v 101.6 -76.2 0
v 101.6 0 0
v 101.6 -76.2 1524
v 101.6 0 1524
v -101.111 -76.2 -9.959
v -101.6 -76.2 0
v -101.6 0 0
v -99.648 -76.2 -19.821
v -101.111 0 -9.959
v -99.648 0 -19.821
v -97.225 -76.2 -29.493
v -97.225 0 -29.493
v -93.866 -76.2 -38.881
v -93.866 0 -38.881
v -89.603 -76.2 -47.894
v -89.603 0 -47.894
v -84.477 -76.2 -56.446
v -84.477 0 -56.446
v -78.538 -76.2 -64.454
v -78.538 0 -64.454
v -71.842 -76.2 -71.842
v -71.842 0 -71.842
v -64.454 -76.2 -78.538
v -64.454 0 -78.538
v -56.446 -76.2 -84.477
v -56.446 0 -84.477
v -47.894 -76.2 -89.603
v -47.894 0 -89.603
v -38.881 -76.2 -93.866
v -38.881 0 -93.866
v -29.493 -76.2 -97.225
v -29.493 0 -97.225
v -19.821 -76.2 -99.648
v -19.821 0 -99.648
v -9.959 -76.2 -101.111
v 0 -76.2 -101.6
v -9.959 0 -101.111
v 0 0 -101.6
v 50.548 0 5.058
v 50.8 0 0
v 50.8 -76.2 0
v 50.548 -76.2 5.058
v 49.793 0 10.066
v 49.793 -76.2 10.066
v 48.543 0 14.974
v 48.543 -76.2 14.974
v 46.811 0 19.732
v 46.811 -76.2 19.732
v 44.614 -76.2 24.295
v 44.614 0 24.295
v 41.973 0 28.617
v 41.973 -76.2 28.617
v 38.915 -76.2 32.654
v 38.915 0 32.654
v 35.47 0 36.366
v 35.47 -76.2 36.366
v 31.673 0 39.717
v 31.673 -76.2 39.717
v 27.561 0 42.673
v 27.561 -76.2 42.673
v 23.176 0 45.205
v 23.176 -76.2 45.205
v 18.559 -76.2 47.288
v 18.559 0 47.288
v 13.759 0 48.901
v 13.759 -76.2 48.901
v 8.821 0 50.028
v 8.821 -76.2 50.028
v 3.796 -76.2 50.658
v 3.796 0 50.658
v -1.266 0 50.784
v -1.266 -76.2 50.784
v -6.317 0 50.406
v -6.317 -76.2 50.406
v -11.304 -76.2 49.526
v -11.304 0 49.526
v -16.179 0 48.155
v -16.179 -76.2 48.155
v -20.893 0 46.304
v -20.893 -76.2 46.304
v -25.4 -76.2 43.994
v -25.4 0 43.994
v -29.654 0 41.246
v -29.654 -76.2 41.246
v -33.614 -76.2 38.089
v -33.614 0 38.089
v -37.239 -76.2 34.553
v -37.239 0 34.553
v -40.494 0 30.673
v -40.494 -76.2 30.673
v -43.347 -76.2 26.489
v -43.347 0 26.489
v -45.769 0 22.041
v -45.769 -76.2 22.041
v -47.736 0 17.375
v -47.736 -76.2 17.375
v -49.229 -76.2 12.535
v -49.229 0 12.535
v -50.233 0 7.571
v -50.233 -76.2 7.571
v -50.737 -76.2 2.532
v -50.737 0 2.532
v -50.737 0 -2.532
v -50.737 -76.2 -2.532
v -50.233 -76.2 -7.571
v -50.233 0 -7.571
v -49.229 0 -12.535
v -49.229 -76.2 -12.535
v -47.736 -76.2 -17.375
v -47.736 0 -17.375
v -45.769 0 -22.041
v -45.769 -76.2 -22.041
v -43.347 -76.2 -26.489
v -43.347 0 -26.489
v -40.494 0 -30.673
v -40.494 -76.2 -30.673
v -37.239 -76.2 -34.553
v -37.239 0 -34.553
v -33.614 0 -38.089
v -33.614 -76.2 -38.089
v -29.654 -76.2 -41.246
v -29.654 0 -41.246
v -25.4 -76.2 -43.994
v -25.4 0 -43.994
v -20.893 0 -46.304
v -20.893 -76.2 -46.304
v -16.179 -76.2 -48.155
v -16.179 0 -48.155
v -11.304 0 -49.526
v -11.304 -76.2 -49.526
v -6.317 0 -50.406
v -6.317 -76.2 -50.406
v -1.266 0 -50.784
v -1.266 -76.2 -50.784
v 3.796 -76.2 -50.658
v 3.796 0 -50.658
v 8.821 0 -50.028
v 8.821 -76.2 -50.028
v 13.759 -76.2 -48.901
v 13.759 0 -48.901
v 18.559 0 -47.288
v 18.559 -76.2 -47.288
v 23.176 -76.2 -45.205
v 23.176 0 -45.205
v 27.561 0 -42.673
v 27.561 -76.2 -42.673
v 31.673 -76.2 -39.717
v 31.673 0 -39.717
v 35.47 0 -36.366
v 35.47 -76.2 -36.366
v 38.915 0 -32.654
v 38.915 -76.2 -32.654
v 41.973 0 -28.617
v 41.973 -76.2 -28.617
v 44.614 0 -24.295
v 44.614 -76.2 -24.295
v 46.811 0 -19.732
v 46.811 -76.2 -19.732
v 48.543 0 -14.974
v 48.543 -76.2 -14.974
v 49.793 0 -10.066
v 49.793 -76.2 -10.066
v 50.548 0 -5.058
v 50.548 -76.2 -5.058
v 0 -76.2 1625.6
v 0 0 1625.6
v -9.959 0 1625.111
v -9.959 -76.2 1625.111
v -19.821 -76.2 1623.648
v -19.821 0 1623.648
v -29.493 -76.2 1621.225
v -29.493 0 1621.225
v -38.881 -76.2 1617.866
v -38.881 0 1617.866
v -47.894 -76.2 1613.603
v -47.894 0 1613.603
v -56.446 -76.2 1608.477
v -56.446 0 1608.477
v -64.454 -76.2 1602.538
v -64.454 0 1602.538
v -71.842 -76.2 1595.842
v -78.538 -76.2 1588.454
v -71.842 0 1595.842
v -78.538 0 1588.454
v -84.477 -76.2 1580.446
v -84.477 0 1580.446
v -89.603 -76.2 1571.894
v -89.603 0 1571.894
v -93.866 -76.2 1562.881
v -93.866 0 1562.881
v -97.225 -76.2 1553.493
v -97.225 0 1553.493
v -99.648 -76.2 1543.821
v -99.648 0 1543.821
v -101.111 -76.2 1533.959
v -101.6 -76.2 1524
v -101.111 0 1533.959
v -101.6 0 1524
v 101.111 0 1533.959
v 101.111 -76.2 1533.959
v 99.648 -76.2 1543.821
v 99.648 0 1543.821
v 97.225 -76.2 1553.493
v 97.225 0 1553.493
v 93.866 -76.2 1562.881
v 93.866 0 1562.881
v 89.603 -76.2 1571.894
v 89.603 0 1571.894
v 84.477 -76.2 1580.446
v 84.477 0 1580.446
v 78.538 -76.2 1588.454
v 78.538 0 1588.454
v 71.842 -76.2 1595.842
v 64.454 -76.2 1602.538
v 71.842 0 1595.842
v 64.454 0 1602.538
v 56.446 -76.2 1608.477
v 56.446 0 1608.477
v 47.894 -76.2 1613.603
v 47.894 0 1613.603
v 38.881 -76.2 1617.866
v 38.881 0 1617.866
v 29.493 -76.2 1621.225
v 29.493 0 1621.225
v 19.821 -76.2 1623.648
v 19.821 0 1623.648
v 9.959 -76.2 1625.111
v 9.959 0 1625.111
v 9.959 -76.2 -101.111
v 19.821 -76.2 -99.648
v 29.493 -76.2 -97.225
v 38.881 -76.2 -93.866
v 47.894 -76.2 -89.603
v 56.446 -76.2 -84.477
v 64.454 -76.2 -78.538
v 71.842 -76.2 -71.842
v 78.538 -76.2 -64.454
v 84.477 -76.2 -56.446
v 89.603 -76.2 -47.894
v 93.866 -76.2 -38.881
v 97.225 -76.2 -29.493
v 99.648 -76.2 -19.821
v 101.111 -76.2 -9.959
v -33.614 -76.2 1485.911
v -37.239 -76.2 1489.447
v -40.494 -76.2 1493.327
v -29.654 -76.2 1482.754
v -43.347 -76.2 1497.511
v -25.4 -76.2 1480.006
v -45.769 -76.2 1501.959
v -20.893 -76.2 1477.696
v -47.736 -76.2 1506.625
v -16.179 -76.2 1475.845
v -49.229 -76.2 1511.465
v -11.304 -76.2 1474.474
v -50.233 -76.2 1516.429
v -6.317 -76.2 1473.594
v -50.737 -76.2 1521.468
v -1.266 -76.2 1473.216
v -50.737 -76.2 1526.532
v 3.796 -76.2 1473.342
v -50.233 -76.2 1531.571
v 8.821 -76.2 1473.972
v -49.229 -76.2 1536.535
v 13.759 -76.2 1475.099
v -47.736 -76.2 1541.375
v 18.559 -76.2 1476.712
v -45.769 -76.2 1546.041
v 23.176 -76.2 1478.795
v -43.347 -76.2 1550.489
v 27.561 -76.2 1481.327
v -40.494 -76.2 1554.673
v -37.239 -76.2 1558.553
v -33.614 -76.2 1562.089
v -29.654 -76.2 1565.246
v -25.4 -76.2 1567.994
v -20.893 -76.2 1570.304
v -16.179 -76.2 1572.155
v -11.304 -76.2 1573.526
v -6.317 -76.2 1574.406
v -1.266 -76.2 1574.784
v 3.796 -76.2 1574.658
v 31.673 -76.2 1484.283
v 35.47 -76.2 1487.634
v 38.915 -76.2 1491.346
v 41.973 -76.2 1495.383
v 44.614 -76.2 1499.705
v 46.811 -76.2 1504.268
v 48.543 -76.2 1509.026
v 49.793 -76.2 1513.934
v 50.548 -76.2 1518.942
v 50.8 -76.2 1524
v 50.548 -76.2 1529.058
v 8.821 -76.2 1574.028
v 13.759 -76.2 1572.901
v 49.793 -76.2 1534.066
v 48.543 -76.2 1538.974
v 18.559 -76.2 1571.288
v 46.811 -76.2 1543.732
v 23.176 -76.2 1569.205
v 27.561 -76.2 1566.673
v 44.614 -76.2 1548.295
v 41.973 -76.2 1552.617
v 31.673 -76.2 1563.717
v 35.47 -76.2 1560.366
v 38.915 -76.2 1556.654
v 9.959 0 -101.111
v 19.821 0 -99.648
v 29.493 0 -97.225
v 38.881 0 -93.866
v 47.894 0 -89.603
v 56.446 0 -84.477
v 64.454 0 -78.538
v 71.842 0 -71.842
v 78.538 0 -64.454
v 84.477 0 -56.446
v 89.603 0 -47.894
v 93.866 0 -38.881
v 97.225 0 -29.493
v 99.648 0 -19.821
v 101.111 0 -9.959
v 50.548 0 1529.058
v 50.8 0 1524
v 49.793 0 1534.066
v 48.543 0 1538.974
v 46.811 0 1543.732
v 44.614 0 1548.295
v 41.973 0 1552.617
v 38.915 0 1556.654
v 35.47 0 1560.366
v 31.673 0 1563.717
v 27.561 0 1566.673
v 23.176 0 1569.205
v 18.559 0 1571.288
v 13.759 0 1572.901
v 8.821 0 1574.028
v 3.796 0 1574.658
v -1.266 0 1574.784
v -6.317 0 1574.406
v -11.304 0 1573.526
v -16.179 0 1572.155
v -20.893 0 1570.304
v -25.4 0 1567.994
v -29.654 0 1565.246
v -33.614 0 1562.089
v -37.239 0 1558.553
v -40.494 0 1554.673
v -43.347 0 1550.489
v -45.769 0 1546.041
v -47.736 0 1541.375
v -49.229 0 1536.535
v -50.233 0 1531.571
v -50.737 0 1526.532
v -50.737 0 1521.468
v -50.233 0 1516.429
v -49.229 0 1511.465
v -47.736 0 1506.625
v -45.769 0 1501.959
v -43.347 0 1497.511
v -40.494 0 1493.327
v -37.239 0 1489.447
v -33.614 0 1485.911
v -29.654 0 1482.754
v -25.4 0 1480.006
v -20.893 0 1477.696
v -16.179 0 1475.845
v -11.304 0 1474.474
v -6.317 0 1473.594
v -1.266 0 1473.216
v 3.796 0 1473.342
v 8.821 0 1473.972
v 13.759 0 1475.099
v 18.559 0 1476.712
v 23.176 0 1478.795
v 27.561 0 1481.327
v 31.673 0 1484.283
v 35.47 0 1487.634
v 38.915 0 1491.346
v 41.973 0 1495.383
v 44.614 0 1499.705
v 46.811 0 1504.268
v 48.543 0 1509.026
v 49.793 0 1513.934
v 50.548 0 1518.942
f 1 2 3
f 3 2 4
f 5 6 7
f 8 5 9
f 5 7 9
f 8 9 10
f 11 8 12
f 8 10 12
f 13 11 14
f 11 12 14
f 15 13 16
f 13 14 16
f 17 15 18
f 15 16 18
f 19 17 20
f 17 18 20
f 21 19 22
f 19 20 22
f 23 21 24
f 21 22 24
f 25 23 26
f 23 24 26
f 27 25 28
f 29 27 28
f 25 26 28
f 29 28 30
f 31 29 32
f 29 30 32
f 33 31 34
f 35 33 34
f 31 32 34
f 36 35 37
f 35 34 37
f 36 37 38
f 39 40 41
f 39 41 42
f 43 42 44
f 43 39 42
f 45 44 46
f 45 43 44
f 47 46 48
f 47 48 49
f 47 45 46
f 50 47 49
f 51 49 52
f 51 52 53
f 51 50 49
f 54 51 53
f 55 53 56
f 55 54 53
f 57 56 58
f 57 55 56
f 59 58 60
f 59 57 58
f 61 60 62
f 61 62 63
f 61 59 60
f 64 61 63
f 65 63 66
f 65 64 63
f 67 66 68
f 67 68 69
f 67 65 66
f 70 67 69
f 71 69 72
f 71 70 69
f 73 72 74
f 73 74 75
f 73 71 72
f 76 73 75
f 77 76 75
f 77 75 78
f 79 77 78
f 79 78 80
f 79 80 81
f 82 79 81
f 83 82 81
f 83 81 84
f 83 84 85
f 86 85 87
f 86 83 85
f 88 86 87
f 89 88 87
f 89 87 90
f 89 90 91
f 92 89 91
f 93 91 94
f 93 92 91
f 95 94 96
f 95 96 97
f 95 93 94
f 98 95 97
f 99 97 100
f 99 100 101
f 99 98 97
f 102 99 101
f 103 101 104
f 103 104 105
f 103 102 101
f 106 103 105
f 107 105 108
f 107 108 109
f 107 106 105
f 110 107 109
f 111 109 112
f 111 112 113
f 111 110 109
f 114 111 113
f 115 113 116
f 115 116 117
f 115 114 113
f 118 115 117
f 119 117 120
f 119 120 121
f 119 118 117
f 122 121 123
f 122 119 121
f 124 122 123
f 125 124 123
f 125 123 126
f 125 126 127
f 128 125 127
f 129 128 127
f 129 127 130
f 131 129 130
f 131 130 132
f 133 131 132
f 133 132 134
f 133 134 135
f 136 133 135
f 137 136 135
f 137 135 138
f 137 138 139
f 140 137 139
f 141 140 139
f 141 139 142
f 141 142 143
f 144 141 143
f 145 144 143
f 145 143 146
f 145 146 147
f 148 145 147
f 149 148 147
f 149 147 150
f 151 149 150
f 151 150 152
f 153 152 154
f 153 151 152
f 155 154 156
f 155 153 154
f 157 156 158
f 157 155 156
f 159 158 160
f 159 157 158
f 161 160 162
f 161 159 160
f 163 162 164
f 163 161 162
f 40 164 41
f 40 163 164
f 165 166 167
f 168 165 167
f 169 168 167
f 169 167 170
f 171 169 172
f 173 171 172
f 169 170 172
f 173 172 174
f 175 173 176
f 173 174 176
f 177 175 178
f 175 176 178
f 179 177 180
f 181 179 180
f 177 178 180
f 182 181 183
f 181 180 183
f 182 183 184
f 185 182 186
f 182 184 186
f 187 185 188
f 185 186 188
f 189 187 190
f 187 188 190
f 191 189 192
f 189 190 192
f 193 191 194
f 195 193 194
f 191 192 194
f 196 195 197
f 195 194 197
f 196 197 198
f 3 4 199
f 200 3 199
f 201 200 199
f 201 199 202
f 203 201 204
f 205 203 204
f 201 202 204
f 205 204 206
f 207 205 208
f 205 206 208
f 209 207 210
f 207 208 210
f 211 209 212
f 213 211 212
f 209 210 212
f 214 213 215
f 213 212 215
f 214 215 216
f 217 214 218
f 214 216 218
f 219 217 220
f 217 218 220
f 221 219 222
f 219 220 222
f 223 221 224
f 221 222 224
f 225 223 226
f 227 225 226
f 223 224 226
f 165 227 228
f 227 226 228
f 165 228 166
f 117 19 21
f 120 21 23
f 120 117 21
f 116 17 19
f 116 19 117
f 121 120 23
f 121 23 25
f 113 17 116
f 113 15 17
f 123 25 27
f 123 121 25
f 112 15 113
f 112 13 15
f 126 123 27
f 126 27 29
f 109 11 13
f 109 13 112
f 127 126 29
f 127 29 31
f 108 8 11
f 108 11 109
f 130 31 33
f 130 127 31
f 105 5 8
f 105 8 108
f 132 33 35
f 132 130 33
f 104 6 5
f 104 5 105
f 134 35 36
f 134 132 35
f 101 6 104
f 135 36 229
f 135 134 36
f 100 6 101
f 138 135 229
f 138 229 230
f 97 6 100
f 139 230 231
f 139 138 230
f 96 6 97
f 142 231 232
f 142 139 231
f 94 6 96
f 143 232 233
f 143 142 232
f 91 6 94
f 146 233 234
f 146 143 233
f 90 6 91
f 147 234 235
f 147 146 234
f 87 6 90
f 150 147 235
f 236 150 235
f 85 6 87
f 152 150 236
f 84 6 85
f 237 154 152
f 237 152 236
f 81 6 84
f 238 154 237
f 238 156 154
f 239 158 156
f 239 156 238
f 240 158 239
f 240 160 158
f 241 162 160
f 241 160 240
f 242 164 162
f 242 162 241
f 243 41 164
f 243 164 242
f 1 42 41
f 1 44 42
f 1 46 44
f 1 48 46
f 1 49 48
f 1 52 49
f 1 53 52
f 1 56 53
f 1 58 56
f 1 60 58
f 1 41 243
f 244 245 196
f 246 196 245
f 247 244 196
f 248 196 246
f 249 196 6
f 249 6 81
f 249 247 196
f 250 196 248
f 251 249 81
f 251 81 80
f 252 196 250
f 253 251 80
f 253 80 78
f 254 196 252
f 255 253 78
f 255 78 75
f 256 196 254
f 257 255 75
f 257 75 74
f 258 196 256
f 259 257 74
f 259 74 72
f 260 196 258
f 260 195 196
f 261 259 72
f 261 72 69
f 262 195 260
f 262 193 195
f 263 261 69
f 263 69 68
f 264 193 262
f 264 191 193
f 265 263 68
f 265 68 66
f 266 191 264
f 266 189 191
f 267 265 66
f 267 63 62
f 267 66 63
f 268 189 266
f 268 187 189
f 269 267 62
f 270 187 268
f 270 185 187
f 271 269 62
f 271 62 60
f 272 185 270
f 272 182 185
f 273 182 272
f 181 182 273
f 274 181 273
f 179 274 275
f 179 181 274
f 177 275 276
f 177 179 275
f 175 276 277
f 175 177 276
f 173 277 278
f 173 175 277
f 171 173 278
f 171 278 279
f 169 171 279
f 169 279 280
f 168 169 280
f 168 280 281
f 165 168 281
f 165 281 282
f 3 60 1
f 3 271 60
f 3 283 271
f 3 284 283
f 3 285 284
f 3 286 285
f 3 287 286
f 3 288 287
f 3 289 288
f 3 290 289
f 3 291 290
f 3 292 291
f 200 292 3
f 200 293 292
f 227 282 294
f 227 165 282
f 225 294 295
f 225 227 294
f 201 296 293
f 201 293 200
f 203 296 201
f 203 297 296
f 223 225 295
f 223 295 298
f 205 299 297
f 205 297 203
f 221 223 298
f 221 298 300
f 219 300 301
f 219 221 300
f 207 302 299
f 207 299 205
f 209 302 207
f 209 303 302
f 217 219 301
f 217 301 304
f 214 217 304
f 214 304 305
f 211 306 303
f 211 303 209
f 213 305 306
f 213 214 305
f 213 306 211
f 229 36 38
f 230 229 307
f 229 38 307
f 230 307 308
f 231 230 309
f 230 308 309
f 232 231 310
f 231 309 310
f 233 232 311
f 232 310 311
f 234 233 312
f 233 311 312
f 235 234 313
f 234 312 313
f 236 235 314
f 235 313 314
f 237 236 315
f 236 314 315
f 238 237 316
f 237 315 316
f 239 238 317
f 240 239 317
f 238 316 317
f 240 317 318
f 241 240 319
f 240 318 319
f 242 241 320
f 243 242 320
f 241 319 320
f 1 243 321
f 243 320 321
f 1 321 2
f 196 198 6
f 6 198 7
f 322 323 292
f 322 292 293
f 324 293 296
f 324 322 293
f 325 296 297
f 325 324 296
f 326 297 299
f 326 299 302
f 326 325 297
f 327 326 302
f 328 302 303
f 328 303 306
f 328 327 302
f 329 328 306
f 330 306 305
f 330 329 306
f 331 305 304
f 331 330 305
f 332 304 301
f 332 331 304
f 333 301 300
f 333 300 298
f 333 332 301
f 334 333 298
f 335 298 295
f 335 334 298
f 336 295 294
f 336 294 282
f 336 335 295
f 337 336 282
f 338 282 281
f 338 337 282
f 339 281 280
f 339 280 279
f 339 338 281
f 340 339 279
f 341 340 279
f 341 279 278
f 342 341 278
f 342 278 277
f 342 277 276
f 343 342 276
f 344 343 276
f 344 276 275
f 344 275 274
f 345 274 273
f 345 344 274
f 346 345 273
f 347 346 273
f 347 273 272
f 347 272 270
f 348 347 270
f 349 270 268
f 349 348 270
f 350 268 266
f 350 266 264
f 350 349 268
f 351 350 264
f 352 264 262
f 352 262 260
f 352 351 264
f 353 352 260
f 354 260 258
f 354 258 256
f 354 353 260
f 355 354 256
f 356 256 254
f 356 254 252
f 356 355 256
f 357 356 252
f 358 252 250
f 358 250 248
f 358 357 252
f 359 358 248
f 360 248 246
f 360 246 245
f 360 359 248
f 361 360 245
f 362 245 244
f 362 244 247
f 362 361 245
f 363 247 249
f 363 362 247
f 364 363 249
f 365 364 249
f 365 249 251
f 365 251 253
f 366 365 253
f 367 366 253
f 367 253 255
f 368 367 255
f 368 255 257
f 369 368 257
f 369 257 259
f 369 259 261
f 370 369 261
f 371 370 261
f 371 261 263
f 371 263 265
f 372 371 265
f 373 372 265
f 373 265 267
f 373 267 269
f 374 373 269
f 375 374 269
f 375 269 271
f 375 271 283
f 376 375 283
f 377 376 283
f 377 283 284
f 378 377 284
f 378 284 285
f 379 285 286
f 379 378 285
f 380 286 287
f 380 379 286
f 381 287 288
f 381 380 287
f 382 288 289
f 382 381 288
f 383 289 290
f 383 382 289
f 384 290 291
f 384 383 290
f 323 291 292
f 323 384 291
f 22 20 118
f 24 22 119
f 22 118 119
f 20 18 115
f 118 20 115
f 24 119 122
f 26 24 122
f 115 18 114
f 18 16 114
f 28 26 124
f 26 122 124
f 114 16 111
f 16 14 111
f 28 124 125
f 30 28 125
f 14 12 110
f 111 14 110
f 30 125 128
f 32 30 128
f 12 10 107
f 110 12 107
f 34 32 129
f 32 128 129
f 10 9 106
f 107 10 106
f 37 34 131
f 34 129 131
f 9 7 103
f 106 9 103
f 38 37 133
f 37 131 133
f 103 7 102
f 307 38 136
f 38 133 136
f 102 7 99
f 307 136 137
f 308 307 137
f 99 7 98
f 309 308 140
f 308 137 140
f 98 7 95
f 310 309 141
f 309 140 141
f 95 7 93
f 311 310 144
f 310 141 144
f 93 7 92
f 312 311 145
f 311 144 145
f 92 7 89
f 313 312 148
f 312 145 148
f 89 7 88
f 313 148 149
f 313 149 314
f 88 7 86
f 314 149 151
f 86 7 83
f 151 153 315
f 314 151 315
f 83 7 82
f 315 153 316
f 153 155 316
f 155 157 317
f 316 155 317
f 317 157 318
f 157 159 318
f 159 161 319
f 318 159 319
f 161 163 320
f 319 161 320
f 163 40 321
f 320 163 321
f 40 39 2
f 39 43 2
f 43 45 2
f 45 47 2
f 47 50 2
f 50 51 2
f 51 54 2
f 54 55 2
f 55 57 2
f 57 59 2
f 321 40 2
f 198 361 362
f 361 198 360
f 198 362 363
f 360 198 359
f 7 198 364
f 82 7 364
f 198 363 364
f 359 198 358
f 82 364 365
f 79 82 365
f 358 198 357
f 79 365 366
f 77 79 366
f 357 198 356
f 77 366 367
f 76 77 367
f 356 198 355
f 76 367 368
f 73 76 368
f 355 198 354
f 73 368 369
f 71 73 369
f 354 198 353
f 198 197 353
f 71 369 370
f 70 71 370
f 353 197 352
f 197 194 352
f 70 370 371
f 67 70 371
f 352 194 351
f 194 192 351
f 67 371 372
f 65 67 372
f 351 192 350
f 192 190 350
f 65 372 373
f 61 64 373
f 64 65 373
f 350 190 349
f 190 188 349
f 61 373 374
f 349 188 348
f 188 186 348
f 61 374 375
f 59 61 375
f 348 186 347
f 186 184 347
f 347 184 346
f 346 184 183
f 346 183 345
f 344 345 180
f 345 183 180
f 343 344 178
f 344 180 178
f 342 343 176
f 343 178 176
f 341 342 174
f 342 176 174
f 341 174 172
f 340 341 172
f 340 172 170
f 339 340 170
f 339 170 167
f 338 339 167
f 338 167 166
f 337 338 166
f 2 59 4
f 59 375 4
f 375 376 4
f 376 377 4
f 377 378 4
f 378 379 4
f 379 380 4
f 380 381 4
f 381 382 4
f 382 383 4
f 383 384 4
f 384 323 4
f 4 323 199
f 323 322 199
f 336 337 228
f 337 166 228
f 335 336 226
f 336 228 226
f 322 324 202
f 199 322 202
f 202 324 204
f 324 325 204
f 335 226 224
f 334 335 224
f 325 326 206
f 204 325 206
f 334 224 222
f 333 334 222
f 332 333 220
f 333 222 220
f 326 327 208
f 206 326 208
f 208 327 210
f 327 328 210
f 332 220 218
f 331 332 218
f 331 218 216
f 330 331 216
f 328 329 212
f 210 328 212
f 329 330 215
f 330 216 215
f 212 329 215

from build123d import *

# Parameters (mm, degrees)
F0_R     = 50.8
F1_DEPTH = 76.2


with BuildPart() as f1:
    # F0 (on Front) → F1 (new body)
    with BuildSketch(Plane.XZ):
        with BuildLine():
            Line((-101.6, 1524), (-101.6, 0))
            ThreePointArc((-101.6, 0), (-71.842049, -71.842049), (0, -101.6))
            ThreePointArc((0, -101.6), (71.842049, -71.842049), (101.6, 0))
            Line((101.6, 0), (101.6, 1524))
            ThreePointArc((101.6, 1524), (71.842049, 1595.842049), (0, 1625.6))
            ThreePointArc((0, 1625.6), (-71.842049, 1595.842049), (-101.6, 1524))
        make_face()
        Circle(F0_R, mode=Mode.SUBTRACT)
        with Locations((0, 1524)):
            Circle(F0_R, mode=Mode.SUBTRACT)
    extrude(amount=F1_DEPTH)


solid = f1.part
